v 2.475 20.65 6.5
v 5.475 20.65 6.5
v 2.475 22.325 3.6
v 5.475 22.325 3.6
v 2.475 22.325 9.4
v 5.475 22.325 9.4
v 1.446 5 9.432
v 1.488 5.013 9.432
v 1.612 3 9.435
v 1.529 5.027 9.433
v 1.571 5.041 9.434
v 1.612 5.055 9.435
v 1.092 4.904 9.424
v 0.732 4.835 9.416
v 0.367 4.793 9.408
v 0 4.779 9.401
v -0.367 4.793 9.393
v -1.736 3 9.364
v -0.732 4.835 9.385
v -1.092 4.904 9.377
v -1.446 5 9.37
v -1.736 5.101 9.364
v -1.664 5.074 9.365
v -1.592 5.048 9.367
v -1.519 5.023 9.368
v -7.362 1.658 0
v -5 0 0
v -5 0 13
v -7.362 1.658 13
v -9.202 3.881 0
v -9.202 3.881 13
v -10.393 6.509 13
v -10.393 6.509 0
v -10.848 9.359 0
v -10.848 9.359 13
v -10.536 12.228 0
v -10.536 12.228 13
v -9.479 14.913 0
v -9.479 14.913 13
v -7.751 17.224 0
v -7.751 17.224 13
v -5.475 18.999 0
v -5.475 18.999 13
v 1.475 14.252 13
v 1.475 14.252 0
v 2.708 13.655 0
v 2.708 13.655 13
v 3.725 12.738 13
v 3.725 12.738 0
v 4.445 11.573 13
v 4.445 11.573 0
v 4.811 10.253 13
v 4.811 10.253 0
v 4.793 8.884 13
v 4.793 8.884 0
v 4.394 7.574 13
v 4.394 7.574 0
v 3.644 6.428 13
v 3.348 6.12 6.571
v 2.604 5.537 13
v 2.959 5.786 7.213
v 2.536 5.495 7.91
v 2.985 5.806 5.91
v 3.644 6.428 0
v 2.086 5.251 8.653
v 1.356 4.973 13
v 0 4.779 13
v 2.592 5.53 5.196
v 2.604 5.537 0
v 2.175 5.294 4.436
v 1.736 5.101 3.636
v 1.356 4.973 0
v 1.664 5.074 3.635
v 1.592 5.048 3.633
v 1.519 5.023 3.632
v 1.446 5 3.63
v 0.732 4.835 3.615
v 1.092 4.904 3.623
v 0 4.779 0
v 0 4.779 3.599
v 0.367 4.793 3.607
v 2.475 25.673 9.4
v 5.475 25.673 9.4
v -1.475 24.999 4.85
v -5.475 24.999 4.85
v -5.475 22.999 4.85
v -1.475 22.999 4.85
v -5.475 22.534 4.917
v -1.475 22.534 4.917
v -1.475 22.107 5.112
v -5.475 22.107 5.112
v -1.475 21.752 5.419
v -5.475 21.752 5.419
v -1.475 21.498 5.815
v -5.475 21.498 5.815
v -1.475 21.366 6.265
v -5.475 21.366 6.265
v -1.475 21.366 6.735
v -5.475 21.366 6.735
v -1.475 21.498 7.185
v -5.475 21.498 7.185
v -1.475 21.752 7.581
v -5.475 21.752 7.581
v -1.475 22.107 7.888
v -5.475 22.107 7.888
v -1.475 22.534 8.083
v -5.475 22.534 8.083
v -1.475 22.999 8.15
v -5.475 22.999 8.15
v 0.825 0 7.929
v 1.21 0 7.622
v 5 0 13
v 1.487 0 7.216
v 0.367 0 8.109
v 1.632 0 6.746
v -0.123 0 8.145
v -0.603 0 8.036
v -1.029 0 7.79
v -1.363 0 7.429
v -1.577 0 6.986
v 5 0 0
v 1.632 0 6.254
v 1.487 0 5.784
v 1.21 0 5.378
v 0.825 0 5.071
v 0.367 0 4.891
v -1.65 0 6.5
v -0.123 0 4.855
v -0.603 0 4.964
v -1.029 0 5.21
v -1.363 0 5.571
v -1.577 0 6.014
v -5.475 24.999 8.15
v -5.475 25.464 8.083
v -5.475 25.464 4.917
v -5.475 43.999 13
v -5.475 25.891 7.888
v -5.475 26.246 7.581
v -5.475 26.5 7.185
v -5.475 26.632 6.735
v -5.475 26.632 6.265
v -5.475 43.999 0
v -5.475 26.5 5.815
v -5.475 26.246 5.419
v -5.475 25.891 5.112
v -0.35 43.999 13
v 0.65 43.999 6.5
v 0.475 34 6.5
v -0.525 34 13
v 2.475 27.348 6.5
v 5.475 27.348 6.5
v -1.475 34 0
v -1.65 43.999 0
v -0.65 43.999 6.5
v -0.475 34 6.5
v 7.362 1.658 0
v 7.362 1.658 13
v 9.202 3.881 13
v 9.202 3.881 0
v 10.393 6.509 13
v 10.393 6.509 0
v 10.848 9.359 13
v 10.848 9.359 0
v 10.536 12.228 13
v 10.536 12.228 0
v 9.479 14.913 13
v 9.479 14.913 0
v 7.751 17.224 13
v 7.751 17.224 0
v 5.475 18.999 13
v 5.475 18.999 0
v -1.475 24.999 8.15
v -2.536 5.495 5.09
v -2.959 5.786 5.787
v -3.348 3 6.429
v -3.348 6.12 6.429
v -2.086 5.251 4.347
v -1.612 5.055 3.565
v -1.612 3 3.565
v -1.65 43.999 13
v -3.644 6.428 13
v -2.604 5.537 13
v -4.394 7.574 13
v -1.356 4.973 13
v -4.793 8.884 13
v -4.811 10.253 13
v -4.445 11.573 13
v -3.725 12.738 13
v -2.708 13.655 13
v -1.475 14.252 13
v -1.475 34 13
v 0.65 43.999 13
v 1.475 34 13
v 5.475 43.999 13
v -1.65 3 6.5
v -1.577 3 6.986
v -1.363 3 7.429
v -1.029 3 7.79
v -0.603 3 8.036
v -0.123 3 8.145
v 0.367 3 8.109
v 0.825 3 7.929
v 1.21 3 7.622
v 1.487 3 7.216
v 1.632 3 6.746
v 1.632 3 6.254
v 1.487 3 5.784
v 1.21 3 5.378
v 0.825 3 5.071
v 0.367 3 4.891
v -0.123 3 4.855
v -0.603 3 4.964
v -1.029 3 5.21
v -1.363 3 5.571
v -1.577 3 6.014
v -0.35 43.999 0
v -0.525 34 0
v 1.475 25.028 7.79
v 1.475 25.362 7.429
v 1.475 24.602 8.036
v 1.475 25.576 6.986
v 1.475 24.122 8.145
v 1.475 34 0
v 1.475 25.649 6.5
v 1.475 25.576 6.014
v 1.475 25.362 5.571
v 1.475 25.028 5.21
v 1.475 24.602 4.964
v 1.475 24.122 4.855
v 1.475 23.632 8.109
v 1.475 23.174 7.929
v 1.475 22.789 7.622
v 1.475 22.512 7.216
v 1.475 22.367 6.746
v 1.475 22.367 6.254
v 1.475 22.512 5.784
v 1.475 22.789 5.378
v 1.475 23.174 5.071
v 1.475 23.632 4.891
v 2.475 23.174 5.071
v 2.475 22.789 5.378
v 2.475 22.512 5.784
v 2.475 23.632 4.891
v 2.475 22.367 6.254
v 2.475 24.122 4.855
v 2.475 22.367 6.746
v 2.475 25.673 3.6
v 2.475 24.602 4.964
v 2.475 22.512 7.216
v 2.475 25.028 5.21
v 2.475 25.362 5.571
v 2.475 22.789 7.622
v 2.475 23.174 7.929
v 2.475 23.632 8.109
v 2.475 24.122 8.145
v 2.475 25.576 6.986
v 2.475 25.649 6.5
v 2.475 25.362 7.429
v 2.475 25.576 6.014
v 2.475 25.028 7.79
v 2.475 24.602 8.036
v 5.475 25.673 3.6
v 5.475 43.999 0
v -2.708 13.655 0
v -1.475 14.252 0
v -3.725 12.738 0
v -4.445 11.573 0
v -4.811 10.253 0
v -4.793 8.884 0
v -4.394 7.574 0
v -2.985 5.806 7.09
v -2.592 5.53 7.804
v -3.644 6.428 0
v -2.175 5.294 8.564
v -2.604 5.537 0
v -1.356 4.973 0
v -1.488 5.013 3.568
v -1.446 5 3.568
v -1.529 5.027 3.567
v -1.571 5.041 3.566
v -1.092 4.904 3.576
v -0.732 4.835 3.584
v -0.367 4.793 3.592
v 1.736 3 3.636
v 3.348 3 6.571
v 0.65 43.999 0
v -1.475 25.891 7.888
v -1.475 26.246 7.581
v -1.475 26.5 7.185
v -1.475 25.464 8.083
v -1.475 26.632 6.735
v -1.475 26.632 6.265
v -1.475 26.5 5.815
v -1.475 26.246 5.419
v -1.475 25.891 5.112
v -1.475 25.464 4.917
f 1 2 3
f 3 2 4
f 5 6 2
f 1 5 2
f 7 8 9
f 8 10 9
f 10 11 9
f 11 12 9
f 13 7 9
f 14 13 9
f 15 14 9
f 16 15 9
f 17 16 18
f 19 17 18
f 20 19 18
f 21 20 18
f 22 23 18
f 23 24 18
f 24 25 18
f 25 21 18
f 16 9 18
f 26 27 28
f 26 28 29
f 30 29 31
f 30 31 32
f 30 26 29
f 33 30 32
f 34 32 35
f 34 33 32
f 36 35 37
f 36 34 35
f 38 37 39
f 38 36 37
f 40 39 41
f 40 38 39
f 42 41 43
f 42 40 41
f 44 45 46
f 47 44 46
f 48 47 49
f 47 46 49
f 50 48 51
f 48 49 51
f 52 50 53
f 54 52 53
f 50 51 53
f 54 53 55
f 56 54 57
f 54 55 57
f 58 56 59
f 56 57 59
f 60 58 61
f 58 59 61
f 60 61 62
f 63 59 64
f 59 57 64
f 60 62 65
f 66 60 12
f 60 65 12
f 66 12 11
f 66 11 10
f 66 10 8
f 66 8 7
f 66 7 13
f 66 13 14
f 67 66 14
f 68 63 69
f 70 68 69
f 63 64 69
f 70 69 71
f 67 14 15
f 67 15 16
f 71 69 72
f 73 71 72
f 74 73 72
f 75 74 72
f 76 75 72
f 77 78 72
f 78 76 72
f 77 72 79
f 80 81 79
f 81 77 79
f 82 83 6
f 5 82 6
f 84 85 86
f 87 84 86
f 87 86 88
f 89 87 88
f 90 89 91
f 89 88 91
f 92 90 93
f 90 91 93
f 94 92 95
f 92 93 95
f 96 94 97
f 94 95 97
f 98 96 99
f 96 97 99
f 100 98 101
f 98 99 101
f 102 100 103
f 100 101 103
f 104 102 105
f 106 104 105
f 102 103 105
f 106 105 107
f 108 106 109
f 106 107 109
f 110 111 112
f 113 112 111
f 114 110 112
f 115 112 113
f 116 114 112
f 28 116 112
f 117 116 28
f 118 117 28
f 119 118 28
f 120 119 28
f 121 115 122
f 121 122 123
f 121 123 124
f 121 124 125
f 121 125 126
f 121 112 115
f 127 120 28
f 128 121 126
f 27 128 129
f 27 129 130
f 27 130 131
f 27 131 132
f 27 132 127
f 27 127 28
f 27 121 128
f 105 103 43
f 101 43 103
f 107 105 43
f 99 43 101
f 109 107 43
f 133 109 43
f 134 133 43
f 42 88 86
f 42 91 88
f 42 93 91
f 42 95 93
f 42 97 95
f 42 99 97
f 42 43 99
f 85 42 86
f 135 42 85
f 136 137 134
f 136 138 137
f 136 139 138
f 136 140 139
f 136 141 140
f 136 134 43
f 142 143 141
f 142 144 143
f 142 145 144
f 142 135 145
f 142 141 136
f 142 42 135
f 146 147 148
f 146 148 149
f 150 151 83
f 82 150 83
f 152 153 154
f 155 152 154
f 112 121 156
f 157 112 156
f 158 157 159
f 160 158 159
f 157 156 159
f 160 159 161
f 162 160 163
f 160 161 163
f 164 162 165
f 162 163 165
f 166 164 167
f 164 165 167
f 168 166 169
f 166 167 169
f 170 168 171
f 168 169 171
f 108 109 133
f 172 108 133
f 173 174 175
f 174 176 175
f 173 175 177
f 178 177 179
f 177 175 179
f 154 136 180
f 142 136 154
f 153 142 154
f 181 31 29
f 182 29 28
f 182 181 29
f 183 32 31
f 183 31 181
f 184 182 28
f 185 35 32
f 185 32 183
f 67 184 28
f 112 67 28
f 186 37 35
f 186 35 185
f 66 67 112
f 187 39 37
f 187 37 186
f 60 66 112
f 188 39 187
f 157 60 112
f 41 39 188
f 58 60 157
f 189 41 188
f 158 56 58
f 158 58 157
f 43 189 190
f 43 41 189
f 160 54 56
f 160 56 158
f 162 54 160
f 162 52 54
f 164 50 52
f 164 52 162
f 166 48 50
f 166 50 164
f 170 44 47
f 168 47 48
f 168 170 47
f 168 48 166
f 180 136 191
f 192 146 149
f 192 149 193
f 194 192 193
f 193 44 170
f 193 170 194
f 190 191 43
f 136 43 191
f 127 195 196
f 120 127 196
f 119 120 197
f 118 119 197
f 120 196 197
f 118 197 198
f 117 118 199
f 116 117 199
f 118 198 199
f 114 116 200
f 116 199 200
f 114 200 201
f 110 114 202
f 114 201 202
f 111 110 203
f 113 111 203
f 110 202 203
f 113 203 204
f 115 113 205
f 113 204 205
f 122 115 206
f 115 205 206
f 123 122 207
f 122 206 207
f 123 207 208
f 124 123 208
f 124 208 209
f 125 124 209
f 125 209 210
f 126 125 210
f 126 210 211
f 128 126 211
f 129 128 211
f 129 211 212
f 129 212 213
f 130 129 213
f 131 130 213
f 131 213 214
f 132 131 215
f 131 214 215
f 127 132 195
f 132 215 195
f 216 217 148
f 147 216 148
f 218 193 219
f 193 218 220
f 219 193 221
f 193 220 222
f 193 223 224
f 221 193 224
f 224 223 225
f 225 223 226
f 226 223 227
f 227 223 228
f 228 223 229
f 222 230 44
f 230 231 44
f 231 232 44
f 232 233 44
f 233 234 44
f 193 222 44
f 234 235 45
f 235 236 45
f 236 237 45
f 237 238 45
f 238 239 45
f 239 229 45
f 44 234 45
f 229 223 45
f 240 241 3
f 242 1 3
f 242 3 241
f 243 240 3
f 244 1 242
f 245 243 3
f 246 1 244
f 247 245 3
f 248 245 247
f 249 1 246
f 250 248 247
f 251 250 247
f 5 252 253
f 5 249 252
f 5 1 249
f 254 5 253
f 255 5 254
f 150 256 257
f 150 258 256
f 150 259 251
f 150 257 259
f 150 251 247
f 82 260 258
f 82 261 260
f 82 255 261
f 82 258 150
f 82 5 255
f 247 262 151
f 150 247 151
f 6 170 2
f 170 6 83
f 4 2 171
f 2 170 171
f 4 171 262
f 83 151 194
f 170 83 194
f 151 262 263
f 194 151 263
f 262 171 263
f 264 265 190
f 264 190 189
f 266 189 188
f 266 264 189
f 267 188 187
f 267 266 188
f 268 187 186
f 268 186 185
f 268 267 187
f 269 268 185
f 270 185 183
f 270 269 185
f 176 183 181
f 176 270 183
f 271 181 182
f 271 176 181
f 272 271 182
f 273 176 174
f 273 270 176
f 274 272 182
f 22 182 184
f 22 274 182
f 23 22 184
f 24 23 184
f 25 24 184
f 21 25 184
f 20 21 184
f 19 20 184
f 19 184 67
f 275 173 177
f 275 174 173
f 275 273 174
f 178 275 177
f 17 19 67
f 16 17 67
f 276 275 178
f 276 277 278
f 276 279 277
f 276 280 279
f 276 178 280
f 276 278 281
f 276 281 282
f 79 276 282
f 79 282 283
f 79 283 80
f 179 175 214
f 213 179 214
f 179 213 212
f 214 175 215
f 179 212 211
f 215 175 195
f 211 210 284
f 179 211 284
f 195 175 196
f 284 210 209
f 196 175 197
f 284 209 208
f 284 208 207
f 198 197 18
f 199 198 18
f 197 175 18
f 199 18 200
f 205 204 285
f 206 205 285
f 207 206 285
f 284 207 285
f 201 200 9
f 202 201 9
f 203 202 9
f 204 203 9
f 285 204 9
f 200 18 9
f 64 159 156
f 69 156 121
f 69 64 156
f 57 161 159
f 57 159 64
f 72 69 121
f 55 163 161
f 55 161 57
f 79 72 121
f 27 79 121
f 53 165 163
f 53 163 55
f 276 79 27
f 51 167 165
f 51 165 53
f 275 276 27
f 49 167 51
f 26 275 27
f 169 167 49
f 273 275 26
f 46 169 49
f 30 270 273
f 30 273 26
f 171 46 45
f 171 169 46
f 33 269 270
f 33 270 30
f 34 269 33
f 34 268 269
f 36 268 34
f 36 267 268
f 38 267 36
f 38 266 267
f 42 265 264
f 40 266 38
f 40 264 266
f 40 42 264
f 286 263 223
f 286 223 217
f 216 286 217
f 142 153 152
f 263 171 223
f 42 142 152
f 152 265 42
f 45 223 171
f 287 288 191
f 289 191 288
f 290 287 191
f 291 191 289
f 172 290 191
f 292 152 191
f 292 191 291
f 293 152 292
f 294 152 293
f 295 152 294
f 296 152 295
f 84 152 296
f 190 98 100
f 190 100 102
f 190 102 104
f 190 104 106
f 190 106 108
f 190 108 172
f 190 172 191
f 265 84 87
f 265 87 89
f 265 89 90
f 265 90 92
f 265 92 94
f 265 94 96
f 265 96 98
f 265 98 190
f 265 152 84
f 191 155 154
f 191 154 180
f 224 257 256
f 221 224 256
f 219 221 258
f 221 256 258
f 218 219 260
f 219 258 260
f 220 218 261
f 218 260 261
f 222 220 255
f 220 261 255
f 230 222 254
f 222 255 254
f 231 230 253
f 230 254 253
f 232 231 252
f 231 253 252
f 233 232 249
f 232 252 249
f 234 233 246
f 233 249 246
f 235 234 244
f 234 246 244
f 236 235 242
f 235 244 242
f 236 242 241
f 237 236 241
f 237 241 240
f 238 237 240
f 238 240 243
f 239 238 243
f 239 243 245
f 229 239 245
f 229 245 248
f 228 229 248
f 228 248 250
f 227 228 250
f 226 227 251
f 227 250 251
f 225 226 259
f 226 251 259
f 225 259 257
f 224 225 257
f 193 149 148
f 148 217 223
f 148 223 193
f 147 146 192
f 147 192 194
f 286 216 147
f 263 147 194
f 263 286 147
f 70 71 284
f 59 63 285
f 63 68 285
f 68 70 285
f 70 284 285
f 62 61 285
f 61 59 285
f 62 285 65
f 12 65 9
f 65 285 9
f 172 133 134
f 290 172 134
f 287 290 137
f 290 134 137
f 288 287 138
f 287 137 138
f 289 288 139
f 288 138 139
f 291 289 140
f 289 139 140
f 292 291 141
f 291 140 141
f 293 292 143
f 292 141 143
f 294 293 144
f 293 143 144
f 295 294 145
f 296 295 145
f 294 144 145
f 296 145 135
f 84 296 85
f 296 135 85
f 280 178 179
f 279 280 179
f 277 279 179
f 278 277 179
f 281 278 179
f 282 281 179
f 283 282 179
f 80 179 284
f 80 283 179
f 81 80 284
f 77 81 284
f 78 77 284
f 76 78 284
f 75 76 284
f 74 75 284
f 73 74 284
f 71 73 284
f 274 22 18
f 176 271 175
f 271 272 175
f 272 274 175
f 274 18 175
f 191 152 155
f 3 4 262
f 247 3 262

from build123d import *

# Parameters (mm, degrees)
F1_DEPTH       = 13
F4_DEPTH       = 3
F5_R           = 1.65
F6_DEPTH       = 1
F8_DEPTH       = 4
F11_DEPTH      = 3
F11_DEPTH_BACK = 2
F12_R          = 1.65
F13_DEPTH      = 3


with BuildPart() as f1:
    # F0 (on Top) → F1 (new body)
    with BuildSketch(Plane.XY):
        with BuildLine():
            Line((0, 0), (5, 0))
            ThreePointArc((5, 0), (10.8477089738, 9.3590674898), (5.4753859206, 18.9988802231))
            Line((5.4753859206, 18.9988802231), (5.4753859206, 43.9988802231))
            Line((5.4753859206, 43.9988802231), (0.649909985, 43.9988802231))
            Line((0.649909985, 43.9988802231), (0.4753859206, 34.0004032716))
            Line((0.4753859206, 34.0004032716), (1.4753859206, 34.0004032716))
            Line((1.4753859206, 34.0004032716), (1.4753859206, 14.2518003603))
            ThreePointArc((1.4753859206, 14.2518003603), (4.7933098793, 8.8839089986), (0, 4.7793922831))
            Line((0, 4.7793922831), (0, 0))
        make_face()
    extrude(amount=F1_DEPTH)

    # F2: F1 across plane


with BuildPart() as f1_1:
    add(f1.part)
    add(f1.part.mirror(Plane.YZ))

    # F3 (on face) → F4 (cut)
    with BuildSketch(Plane.YZ.offset(5.4753859206)):
        Polygon((22.3245644425, 3.6), (25.6731960038, 3.6), (27.3475117844, 6.5), (25.6731960038, 9.4), (22.3245644425, 9.4), (20.6502486618, 6.5), align=None)
    extrude(amount=-F4_DEPTH, mode=Mode.SUBTRACT)

    # F5 (on face) → F6 (cut, through all)
    with BuildSketch(Plane.YZ.offset(2.4753859206)):
        with Locations((23.9988802231, 6.5)):
            Circle(F5_R)
    extrude(amount=-F6_DEPTH, mode=Mode.SUBTRACT)

    # F7 (on face) → F8 (cut, through all)
    with BuildSketch(Plane(origin=(-5.4753859206, 0, 0), x_dir=(0, -1, 0), z_dir=(-1, 0, 0))):
        with BuildLine():
            ThreePointArc((-22.9988802231, 4.85), (-21.3488802231, 6.5), (-22.9988802231, 8.15))
            Line((-22.9988802231, 8.15), (-24.9988802231, 8.15))
            ThreePointArc((-24.9988802231, 8.15), (-26.6488802231, 6.5), (-24.9988802231, 4.85))
            Line((-24.9988802231, 4.85), (-22.9988802231, 4.85))
        make_face()
    extrude(amount=-F8_DEPTH, mode=Mode.SUBTRACT)

    # F10 (on offset) → F11 (cut, two sides)
    with BuildSketch(Plane.XZ.offset(-5)) as f11_sk:
        Polygon((1.7358122868, 3.6363853195), (3.3478692034, 6.5714501963), (1.6120569166, 9.4350648768), (-1.7358122868, 9.3636146805), (-3.3478692034, 6.4285498037), (-1.6120569166, 3.5649351232), align=None)
    extrude(amount=-F11_DEPTH, mode=Mode.SUBTRACT)
    extrude(f11_sk.sketch, amount=F11_DEPTH_BACK, mode=Mode.SUBTRACT)

    # F12 (on face) → F13 (cut, through all)
    with BuildSketch(Plane(origin=(0, 3, 0), x_dir=(-1, 0, 0), z_dir=(0, 1, 0))):
        with Locations((0, 6.5)):
            Circle(F12_R)
    extrude(amount=-F13_DEPTH, mode=Mode.SUBTRACT)

    # F15: sweep along a path in F15_path
    with BuildLine(Plane(origin=(-0.649909985, 43.9988802231, 13), x_dir=(-0.0174524064, 0.9998476952, 0), z_dir=(-0.9998476952, -0.0174524064, 0))) as f15_path:
        Line((0, 0), (-10, 0))
    # F14 (on face) → F15 (sweep, cut)
    with BuildSketch(Plane(origin=(0, 43.9988802231, 0), x_dir=(-1, 0, 0), z_dir=(0, 1, 0))):
        Polygon((0.649909985, 6.5), (1.649909985, 13), (0.449909985, 13), (0.449909985, 0), (1.649909985, 0), align=None)
    sweep(path=f15_path.line, mode=Mode.SUBTRACT)

    # F17: sweep along a path in F17_path
    with BuildLine(Plane(origin=(0.4753859206, 34.0004032716, 13), x_dir=(-0.0174524064, -0.9998476952, 0), z_dir=(0.9998476952, -0.0174524064, 0))) as f17_path:
        Line((0, 0), (-10, 0))
    # F16 (on face) → F17 (sweep)
    with BuildSketch(Plane(origin=(0, 43.9988802231, 0), x_dir=(-1, 0, 0), z_dir=(0, 1, 0))):
        Polygon((-0.649909985, 6.5), (0.350090015, 13), (-1.3149922222, 13), (-1.3149922222, 0), (0.350090015, 0), align=None)
    sweep(path=f17_path.line)


solid = f1_1.part
